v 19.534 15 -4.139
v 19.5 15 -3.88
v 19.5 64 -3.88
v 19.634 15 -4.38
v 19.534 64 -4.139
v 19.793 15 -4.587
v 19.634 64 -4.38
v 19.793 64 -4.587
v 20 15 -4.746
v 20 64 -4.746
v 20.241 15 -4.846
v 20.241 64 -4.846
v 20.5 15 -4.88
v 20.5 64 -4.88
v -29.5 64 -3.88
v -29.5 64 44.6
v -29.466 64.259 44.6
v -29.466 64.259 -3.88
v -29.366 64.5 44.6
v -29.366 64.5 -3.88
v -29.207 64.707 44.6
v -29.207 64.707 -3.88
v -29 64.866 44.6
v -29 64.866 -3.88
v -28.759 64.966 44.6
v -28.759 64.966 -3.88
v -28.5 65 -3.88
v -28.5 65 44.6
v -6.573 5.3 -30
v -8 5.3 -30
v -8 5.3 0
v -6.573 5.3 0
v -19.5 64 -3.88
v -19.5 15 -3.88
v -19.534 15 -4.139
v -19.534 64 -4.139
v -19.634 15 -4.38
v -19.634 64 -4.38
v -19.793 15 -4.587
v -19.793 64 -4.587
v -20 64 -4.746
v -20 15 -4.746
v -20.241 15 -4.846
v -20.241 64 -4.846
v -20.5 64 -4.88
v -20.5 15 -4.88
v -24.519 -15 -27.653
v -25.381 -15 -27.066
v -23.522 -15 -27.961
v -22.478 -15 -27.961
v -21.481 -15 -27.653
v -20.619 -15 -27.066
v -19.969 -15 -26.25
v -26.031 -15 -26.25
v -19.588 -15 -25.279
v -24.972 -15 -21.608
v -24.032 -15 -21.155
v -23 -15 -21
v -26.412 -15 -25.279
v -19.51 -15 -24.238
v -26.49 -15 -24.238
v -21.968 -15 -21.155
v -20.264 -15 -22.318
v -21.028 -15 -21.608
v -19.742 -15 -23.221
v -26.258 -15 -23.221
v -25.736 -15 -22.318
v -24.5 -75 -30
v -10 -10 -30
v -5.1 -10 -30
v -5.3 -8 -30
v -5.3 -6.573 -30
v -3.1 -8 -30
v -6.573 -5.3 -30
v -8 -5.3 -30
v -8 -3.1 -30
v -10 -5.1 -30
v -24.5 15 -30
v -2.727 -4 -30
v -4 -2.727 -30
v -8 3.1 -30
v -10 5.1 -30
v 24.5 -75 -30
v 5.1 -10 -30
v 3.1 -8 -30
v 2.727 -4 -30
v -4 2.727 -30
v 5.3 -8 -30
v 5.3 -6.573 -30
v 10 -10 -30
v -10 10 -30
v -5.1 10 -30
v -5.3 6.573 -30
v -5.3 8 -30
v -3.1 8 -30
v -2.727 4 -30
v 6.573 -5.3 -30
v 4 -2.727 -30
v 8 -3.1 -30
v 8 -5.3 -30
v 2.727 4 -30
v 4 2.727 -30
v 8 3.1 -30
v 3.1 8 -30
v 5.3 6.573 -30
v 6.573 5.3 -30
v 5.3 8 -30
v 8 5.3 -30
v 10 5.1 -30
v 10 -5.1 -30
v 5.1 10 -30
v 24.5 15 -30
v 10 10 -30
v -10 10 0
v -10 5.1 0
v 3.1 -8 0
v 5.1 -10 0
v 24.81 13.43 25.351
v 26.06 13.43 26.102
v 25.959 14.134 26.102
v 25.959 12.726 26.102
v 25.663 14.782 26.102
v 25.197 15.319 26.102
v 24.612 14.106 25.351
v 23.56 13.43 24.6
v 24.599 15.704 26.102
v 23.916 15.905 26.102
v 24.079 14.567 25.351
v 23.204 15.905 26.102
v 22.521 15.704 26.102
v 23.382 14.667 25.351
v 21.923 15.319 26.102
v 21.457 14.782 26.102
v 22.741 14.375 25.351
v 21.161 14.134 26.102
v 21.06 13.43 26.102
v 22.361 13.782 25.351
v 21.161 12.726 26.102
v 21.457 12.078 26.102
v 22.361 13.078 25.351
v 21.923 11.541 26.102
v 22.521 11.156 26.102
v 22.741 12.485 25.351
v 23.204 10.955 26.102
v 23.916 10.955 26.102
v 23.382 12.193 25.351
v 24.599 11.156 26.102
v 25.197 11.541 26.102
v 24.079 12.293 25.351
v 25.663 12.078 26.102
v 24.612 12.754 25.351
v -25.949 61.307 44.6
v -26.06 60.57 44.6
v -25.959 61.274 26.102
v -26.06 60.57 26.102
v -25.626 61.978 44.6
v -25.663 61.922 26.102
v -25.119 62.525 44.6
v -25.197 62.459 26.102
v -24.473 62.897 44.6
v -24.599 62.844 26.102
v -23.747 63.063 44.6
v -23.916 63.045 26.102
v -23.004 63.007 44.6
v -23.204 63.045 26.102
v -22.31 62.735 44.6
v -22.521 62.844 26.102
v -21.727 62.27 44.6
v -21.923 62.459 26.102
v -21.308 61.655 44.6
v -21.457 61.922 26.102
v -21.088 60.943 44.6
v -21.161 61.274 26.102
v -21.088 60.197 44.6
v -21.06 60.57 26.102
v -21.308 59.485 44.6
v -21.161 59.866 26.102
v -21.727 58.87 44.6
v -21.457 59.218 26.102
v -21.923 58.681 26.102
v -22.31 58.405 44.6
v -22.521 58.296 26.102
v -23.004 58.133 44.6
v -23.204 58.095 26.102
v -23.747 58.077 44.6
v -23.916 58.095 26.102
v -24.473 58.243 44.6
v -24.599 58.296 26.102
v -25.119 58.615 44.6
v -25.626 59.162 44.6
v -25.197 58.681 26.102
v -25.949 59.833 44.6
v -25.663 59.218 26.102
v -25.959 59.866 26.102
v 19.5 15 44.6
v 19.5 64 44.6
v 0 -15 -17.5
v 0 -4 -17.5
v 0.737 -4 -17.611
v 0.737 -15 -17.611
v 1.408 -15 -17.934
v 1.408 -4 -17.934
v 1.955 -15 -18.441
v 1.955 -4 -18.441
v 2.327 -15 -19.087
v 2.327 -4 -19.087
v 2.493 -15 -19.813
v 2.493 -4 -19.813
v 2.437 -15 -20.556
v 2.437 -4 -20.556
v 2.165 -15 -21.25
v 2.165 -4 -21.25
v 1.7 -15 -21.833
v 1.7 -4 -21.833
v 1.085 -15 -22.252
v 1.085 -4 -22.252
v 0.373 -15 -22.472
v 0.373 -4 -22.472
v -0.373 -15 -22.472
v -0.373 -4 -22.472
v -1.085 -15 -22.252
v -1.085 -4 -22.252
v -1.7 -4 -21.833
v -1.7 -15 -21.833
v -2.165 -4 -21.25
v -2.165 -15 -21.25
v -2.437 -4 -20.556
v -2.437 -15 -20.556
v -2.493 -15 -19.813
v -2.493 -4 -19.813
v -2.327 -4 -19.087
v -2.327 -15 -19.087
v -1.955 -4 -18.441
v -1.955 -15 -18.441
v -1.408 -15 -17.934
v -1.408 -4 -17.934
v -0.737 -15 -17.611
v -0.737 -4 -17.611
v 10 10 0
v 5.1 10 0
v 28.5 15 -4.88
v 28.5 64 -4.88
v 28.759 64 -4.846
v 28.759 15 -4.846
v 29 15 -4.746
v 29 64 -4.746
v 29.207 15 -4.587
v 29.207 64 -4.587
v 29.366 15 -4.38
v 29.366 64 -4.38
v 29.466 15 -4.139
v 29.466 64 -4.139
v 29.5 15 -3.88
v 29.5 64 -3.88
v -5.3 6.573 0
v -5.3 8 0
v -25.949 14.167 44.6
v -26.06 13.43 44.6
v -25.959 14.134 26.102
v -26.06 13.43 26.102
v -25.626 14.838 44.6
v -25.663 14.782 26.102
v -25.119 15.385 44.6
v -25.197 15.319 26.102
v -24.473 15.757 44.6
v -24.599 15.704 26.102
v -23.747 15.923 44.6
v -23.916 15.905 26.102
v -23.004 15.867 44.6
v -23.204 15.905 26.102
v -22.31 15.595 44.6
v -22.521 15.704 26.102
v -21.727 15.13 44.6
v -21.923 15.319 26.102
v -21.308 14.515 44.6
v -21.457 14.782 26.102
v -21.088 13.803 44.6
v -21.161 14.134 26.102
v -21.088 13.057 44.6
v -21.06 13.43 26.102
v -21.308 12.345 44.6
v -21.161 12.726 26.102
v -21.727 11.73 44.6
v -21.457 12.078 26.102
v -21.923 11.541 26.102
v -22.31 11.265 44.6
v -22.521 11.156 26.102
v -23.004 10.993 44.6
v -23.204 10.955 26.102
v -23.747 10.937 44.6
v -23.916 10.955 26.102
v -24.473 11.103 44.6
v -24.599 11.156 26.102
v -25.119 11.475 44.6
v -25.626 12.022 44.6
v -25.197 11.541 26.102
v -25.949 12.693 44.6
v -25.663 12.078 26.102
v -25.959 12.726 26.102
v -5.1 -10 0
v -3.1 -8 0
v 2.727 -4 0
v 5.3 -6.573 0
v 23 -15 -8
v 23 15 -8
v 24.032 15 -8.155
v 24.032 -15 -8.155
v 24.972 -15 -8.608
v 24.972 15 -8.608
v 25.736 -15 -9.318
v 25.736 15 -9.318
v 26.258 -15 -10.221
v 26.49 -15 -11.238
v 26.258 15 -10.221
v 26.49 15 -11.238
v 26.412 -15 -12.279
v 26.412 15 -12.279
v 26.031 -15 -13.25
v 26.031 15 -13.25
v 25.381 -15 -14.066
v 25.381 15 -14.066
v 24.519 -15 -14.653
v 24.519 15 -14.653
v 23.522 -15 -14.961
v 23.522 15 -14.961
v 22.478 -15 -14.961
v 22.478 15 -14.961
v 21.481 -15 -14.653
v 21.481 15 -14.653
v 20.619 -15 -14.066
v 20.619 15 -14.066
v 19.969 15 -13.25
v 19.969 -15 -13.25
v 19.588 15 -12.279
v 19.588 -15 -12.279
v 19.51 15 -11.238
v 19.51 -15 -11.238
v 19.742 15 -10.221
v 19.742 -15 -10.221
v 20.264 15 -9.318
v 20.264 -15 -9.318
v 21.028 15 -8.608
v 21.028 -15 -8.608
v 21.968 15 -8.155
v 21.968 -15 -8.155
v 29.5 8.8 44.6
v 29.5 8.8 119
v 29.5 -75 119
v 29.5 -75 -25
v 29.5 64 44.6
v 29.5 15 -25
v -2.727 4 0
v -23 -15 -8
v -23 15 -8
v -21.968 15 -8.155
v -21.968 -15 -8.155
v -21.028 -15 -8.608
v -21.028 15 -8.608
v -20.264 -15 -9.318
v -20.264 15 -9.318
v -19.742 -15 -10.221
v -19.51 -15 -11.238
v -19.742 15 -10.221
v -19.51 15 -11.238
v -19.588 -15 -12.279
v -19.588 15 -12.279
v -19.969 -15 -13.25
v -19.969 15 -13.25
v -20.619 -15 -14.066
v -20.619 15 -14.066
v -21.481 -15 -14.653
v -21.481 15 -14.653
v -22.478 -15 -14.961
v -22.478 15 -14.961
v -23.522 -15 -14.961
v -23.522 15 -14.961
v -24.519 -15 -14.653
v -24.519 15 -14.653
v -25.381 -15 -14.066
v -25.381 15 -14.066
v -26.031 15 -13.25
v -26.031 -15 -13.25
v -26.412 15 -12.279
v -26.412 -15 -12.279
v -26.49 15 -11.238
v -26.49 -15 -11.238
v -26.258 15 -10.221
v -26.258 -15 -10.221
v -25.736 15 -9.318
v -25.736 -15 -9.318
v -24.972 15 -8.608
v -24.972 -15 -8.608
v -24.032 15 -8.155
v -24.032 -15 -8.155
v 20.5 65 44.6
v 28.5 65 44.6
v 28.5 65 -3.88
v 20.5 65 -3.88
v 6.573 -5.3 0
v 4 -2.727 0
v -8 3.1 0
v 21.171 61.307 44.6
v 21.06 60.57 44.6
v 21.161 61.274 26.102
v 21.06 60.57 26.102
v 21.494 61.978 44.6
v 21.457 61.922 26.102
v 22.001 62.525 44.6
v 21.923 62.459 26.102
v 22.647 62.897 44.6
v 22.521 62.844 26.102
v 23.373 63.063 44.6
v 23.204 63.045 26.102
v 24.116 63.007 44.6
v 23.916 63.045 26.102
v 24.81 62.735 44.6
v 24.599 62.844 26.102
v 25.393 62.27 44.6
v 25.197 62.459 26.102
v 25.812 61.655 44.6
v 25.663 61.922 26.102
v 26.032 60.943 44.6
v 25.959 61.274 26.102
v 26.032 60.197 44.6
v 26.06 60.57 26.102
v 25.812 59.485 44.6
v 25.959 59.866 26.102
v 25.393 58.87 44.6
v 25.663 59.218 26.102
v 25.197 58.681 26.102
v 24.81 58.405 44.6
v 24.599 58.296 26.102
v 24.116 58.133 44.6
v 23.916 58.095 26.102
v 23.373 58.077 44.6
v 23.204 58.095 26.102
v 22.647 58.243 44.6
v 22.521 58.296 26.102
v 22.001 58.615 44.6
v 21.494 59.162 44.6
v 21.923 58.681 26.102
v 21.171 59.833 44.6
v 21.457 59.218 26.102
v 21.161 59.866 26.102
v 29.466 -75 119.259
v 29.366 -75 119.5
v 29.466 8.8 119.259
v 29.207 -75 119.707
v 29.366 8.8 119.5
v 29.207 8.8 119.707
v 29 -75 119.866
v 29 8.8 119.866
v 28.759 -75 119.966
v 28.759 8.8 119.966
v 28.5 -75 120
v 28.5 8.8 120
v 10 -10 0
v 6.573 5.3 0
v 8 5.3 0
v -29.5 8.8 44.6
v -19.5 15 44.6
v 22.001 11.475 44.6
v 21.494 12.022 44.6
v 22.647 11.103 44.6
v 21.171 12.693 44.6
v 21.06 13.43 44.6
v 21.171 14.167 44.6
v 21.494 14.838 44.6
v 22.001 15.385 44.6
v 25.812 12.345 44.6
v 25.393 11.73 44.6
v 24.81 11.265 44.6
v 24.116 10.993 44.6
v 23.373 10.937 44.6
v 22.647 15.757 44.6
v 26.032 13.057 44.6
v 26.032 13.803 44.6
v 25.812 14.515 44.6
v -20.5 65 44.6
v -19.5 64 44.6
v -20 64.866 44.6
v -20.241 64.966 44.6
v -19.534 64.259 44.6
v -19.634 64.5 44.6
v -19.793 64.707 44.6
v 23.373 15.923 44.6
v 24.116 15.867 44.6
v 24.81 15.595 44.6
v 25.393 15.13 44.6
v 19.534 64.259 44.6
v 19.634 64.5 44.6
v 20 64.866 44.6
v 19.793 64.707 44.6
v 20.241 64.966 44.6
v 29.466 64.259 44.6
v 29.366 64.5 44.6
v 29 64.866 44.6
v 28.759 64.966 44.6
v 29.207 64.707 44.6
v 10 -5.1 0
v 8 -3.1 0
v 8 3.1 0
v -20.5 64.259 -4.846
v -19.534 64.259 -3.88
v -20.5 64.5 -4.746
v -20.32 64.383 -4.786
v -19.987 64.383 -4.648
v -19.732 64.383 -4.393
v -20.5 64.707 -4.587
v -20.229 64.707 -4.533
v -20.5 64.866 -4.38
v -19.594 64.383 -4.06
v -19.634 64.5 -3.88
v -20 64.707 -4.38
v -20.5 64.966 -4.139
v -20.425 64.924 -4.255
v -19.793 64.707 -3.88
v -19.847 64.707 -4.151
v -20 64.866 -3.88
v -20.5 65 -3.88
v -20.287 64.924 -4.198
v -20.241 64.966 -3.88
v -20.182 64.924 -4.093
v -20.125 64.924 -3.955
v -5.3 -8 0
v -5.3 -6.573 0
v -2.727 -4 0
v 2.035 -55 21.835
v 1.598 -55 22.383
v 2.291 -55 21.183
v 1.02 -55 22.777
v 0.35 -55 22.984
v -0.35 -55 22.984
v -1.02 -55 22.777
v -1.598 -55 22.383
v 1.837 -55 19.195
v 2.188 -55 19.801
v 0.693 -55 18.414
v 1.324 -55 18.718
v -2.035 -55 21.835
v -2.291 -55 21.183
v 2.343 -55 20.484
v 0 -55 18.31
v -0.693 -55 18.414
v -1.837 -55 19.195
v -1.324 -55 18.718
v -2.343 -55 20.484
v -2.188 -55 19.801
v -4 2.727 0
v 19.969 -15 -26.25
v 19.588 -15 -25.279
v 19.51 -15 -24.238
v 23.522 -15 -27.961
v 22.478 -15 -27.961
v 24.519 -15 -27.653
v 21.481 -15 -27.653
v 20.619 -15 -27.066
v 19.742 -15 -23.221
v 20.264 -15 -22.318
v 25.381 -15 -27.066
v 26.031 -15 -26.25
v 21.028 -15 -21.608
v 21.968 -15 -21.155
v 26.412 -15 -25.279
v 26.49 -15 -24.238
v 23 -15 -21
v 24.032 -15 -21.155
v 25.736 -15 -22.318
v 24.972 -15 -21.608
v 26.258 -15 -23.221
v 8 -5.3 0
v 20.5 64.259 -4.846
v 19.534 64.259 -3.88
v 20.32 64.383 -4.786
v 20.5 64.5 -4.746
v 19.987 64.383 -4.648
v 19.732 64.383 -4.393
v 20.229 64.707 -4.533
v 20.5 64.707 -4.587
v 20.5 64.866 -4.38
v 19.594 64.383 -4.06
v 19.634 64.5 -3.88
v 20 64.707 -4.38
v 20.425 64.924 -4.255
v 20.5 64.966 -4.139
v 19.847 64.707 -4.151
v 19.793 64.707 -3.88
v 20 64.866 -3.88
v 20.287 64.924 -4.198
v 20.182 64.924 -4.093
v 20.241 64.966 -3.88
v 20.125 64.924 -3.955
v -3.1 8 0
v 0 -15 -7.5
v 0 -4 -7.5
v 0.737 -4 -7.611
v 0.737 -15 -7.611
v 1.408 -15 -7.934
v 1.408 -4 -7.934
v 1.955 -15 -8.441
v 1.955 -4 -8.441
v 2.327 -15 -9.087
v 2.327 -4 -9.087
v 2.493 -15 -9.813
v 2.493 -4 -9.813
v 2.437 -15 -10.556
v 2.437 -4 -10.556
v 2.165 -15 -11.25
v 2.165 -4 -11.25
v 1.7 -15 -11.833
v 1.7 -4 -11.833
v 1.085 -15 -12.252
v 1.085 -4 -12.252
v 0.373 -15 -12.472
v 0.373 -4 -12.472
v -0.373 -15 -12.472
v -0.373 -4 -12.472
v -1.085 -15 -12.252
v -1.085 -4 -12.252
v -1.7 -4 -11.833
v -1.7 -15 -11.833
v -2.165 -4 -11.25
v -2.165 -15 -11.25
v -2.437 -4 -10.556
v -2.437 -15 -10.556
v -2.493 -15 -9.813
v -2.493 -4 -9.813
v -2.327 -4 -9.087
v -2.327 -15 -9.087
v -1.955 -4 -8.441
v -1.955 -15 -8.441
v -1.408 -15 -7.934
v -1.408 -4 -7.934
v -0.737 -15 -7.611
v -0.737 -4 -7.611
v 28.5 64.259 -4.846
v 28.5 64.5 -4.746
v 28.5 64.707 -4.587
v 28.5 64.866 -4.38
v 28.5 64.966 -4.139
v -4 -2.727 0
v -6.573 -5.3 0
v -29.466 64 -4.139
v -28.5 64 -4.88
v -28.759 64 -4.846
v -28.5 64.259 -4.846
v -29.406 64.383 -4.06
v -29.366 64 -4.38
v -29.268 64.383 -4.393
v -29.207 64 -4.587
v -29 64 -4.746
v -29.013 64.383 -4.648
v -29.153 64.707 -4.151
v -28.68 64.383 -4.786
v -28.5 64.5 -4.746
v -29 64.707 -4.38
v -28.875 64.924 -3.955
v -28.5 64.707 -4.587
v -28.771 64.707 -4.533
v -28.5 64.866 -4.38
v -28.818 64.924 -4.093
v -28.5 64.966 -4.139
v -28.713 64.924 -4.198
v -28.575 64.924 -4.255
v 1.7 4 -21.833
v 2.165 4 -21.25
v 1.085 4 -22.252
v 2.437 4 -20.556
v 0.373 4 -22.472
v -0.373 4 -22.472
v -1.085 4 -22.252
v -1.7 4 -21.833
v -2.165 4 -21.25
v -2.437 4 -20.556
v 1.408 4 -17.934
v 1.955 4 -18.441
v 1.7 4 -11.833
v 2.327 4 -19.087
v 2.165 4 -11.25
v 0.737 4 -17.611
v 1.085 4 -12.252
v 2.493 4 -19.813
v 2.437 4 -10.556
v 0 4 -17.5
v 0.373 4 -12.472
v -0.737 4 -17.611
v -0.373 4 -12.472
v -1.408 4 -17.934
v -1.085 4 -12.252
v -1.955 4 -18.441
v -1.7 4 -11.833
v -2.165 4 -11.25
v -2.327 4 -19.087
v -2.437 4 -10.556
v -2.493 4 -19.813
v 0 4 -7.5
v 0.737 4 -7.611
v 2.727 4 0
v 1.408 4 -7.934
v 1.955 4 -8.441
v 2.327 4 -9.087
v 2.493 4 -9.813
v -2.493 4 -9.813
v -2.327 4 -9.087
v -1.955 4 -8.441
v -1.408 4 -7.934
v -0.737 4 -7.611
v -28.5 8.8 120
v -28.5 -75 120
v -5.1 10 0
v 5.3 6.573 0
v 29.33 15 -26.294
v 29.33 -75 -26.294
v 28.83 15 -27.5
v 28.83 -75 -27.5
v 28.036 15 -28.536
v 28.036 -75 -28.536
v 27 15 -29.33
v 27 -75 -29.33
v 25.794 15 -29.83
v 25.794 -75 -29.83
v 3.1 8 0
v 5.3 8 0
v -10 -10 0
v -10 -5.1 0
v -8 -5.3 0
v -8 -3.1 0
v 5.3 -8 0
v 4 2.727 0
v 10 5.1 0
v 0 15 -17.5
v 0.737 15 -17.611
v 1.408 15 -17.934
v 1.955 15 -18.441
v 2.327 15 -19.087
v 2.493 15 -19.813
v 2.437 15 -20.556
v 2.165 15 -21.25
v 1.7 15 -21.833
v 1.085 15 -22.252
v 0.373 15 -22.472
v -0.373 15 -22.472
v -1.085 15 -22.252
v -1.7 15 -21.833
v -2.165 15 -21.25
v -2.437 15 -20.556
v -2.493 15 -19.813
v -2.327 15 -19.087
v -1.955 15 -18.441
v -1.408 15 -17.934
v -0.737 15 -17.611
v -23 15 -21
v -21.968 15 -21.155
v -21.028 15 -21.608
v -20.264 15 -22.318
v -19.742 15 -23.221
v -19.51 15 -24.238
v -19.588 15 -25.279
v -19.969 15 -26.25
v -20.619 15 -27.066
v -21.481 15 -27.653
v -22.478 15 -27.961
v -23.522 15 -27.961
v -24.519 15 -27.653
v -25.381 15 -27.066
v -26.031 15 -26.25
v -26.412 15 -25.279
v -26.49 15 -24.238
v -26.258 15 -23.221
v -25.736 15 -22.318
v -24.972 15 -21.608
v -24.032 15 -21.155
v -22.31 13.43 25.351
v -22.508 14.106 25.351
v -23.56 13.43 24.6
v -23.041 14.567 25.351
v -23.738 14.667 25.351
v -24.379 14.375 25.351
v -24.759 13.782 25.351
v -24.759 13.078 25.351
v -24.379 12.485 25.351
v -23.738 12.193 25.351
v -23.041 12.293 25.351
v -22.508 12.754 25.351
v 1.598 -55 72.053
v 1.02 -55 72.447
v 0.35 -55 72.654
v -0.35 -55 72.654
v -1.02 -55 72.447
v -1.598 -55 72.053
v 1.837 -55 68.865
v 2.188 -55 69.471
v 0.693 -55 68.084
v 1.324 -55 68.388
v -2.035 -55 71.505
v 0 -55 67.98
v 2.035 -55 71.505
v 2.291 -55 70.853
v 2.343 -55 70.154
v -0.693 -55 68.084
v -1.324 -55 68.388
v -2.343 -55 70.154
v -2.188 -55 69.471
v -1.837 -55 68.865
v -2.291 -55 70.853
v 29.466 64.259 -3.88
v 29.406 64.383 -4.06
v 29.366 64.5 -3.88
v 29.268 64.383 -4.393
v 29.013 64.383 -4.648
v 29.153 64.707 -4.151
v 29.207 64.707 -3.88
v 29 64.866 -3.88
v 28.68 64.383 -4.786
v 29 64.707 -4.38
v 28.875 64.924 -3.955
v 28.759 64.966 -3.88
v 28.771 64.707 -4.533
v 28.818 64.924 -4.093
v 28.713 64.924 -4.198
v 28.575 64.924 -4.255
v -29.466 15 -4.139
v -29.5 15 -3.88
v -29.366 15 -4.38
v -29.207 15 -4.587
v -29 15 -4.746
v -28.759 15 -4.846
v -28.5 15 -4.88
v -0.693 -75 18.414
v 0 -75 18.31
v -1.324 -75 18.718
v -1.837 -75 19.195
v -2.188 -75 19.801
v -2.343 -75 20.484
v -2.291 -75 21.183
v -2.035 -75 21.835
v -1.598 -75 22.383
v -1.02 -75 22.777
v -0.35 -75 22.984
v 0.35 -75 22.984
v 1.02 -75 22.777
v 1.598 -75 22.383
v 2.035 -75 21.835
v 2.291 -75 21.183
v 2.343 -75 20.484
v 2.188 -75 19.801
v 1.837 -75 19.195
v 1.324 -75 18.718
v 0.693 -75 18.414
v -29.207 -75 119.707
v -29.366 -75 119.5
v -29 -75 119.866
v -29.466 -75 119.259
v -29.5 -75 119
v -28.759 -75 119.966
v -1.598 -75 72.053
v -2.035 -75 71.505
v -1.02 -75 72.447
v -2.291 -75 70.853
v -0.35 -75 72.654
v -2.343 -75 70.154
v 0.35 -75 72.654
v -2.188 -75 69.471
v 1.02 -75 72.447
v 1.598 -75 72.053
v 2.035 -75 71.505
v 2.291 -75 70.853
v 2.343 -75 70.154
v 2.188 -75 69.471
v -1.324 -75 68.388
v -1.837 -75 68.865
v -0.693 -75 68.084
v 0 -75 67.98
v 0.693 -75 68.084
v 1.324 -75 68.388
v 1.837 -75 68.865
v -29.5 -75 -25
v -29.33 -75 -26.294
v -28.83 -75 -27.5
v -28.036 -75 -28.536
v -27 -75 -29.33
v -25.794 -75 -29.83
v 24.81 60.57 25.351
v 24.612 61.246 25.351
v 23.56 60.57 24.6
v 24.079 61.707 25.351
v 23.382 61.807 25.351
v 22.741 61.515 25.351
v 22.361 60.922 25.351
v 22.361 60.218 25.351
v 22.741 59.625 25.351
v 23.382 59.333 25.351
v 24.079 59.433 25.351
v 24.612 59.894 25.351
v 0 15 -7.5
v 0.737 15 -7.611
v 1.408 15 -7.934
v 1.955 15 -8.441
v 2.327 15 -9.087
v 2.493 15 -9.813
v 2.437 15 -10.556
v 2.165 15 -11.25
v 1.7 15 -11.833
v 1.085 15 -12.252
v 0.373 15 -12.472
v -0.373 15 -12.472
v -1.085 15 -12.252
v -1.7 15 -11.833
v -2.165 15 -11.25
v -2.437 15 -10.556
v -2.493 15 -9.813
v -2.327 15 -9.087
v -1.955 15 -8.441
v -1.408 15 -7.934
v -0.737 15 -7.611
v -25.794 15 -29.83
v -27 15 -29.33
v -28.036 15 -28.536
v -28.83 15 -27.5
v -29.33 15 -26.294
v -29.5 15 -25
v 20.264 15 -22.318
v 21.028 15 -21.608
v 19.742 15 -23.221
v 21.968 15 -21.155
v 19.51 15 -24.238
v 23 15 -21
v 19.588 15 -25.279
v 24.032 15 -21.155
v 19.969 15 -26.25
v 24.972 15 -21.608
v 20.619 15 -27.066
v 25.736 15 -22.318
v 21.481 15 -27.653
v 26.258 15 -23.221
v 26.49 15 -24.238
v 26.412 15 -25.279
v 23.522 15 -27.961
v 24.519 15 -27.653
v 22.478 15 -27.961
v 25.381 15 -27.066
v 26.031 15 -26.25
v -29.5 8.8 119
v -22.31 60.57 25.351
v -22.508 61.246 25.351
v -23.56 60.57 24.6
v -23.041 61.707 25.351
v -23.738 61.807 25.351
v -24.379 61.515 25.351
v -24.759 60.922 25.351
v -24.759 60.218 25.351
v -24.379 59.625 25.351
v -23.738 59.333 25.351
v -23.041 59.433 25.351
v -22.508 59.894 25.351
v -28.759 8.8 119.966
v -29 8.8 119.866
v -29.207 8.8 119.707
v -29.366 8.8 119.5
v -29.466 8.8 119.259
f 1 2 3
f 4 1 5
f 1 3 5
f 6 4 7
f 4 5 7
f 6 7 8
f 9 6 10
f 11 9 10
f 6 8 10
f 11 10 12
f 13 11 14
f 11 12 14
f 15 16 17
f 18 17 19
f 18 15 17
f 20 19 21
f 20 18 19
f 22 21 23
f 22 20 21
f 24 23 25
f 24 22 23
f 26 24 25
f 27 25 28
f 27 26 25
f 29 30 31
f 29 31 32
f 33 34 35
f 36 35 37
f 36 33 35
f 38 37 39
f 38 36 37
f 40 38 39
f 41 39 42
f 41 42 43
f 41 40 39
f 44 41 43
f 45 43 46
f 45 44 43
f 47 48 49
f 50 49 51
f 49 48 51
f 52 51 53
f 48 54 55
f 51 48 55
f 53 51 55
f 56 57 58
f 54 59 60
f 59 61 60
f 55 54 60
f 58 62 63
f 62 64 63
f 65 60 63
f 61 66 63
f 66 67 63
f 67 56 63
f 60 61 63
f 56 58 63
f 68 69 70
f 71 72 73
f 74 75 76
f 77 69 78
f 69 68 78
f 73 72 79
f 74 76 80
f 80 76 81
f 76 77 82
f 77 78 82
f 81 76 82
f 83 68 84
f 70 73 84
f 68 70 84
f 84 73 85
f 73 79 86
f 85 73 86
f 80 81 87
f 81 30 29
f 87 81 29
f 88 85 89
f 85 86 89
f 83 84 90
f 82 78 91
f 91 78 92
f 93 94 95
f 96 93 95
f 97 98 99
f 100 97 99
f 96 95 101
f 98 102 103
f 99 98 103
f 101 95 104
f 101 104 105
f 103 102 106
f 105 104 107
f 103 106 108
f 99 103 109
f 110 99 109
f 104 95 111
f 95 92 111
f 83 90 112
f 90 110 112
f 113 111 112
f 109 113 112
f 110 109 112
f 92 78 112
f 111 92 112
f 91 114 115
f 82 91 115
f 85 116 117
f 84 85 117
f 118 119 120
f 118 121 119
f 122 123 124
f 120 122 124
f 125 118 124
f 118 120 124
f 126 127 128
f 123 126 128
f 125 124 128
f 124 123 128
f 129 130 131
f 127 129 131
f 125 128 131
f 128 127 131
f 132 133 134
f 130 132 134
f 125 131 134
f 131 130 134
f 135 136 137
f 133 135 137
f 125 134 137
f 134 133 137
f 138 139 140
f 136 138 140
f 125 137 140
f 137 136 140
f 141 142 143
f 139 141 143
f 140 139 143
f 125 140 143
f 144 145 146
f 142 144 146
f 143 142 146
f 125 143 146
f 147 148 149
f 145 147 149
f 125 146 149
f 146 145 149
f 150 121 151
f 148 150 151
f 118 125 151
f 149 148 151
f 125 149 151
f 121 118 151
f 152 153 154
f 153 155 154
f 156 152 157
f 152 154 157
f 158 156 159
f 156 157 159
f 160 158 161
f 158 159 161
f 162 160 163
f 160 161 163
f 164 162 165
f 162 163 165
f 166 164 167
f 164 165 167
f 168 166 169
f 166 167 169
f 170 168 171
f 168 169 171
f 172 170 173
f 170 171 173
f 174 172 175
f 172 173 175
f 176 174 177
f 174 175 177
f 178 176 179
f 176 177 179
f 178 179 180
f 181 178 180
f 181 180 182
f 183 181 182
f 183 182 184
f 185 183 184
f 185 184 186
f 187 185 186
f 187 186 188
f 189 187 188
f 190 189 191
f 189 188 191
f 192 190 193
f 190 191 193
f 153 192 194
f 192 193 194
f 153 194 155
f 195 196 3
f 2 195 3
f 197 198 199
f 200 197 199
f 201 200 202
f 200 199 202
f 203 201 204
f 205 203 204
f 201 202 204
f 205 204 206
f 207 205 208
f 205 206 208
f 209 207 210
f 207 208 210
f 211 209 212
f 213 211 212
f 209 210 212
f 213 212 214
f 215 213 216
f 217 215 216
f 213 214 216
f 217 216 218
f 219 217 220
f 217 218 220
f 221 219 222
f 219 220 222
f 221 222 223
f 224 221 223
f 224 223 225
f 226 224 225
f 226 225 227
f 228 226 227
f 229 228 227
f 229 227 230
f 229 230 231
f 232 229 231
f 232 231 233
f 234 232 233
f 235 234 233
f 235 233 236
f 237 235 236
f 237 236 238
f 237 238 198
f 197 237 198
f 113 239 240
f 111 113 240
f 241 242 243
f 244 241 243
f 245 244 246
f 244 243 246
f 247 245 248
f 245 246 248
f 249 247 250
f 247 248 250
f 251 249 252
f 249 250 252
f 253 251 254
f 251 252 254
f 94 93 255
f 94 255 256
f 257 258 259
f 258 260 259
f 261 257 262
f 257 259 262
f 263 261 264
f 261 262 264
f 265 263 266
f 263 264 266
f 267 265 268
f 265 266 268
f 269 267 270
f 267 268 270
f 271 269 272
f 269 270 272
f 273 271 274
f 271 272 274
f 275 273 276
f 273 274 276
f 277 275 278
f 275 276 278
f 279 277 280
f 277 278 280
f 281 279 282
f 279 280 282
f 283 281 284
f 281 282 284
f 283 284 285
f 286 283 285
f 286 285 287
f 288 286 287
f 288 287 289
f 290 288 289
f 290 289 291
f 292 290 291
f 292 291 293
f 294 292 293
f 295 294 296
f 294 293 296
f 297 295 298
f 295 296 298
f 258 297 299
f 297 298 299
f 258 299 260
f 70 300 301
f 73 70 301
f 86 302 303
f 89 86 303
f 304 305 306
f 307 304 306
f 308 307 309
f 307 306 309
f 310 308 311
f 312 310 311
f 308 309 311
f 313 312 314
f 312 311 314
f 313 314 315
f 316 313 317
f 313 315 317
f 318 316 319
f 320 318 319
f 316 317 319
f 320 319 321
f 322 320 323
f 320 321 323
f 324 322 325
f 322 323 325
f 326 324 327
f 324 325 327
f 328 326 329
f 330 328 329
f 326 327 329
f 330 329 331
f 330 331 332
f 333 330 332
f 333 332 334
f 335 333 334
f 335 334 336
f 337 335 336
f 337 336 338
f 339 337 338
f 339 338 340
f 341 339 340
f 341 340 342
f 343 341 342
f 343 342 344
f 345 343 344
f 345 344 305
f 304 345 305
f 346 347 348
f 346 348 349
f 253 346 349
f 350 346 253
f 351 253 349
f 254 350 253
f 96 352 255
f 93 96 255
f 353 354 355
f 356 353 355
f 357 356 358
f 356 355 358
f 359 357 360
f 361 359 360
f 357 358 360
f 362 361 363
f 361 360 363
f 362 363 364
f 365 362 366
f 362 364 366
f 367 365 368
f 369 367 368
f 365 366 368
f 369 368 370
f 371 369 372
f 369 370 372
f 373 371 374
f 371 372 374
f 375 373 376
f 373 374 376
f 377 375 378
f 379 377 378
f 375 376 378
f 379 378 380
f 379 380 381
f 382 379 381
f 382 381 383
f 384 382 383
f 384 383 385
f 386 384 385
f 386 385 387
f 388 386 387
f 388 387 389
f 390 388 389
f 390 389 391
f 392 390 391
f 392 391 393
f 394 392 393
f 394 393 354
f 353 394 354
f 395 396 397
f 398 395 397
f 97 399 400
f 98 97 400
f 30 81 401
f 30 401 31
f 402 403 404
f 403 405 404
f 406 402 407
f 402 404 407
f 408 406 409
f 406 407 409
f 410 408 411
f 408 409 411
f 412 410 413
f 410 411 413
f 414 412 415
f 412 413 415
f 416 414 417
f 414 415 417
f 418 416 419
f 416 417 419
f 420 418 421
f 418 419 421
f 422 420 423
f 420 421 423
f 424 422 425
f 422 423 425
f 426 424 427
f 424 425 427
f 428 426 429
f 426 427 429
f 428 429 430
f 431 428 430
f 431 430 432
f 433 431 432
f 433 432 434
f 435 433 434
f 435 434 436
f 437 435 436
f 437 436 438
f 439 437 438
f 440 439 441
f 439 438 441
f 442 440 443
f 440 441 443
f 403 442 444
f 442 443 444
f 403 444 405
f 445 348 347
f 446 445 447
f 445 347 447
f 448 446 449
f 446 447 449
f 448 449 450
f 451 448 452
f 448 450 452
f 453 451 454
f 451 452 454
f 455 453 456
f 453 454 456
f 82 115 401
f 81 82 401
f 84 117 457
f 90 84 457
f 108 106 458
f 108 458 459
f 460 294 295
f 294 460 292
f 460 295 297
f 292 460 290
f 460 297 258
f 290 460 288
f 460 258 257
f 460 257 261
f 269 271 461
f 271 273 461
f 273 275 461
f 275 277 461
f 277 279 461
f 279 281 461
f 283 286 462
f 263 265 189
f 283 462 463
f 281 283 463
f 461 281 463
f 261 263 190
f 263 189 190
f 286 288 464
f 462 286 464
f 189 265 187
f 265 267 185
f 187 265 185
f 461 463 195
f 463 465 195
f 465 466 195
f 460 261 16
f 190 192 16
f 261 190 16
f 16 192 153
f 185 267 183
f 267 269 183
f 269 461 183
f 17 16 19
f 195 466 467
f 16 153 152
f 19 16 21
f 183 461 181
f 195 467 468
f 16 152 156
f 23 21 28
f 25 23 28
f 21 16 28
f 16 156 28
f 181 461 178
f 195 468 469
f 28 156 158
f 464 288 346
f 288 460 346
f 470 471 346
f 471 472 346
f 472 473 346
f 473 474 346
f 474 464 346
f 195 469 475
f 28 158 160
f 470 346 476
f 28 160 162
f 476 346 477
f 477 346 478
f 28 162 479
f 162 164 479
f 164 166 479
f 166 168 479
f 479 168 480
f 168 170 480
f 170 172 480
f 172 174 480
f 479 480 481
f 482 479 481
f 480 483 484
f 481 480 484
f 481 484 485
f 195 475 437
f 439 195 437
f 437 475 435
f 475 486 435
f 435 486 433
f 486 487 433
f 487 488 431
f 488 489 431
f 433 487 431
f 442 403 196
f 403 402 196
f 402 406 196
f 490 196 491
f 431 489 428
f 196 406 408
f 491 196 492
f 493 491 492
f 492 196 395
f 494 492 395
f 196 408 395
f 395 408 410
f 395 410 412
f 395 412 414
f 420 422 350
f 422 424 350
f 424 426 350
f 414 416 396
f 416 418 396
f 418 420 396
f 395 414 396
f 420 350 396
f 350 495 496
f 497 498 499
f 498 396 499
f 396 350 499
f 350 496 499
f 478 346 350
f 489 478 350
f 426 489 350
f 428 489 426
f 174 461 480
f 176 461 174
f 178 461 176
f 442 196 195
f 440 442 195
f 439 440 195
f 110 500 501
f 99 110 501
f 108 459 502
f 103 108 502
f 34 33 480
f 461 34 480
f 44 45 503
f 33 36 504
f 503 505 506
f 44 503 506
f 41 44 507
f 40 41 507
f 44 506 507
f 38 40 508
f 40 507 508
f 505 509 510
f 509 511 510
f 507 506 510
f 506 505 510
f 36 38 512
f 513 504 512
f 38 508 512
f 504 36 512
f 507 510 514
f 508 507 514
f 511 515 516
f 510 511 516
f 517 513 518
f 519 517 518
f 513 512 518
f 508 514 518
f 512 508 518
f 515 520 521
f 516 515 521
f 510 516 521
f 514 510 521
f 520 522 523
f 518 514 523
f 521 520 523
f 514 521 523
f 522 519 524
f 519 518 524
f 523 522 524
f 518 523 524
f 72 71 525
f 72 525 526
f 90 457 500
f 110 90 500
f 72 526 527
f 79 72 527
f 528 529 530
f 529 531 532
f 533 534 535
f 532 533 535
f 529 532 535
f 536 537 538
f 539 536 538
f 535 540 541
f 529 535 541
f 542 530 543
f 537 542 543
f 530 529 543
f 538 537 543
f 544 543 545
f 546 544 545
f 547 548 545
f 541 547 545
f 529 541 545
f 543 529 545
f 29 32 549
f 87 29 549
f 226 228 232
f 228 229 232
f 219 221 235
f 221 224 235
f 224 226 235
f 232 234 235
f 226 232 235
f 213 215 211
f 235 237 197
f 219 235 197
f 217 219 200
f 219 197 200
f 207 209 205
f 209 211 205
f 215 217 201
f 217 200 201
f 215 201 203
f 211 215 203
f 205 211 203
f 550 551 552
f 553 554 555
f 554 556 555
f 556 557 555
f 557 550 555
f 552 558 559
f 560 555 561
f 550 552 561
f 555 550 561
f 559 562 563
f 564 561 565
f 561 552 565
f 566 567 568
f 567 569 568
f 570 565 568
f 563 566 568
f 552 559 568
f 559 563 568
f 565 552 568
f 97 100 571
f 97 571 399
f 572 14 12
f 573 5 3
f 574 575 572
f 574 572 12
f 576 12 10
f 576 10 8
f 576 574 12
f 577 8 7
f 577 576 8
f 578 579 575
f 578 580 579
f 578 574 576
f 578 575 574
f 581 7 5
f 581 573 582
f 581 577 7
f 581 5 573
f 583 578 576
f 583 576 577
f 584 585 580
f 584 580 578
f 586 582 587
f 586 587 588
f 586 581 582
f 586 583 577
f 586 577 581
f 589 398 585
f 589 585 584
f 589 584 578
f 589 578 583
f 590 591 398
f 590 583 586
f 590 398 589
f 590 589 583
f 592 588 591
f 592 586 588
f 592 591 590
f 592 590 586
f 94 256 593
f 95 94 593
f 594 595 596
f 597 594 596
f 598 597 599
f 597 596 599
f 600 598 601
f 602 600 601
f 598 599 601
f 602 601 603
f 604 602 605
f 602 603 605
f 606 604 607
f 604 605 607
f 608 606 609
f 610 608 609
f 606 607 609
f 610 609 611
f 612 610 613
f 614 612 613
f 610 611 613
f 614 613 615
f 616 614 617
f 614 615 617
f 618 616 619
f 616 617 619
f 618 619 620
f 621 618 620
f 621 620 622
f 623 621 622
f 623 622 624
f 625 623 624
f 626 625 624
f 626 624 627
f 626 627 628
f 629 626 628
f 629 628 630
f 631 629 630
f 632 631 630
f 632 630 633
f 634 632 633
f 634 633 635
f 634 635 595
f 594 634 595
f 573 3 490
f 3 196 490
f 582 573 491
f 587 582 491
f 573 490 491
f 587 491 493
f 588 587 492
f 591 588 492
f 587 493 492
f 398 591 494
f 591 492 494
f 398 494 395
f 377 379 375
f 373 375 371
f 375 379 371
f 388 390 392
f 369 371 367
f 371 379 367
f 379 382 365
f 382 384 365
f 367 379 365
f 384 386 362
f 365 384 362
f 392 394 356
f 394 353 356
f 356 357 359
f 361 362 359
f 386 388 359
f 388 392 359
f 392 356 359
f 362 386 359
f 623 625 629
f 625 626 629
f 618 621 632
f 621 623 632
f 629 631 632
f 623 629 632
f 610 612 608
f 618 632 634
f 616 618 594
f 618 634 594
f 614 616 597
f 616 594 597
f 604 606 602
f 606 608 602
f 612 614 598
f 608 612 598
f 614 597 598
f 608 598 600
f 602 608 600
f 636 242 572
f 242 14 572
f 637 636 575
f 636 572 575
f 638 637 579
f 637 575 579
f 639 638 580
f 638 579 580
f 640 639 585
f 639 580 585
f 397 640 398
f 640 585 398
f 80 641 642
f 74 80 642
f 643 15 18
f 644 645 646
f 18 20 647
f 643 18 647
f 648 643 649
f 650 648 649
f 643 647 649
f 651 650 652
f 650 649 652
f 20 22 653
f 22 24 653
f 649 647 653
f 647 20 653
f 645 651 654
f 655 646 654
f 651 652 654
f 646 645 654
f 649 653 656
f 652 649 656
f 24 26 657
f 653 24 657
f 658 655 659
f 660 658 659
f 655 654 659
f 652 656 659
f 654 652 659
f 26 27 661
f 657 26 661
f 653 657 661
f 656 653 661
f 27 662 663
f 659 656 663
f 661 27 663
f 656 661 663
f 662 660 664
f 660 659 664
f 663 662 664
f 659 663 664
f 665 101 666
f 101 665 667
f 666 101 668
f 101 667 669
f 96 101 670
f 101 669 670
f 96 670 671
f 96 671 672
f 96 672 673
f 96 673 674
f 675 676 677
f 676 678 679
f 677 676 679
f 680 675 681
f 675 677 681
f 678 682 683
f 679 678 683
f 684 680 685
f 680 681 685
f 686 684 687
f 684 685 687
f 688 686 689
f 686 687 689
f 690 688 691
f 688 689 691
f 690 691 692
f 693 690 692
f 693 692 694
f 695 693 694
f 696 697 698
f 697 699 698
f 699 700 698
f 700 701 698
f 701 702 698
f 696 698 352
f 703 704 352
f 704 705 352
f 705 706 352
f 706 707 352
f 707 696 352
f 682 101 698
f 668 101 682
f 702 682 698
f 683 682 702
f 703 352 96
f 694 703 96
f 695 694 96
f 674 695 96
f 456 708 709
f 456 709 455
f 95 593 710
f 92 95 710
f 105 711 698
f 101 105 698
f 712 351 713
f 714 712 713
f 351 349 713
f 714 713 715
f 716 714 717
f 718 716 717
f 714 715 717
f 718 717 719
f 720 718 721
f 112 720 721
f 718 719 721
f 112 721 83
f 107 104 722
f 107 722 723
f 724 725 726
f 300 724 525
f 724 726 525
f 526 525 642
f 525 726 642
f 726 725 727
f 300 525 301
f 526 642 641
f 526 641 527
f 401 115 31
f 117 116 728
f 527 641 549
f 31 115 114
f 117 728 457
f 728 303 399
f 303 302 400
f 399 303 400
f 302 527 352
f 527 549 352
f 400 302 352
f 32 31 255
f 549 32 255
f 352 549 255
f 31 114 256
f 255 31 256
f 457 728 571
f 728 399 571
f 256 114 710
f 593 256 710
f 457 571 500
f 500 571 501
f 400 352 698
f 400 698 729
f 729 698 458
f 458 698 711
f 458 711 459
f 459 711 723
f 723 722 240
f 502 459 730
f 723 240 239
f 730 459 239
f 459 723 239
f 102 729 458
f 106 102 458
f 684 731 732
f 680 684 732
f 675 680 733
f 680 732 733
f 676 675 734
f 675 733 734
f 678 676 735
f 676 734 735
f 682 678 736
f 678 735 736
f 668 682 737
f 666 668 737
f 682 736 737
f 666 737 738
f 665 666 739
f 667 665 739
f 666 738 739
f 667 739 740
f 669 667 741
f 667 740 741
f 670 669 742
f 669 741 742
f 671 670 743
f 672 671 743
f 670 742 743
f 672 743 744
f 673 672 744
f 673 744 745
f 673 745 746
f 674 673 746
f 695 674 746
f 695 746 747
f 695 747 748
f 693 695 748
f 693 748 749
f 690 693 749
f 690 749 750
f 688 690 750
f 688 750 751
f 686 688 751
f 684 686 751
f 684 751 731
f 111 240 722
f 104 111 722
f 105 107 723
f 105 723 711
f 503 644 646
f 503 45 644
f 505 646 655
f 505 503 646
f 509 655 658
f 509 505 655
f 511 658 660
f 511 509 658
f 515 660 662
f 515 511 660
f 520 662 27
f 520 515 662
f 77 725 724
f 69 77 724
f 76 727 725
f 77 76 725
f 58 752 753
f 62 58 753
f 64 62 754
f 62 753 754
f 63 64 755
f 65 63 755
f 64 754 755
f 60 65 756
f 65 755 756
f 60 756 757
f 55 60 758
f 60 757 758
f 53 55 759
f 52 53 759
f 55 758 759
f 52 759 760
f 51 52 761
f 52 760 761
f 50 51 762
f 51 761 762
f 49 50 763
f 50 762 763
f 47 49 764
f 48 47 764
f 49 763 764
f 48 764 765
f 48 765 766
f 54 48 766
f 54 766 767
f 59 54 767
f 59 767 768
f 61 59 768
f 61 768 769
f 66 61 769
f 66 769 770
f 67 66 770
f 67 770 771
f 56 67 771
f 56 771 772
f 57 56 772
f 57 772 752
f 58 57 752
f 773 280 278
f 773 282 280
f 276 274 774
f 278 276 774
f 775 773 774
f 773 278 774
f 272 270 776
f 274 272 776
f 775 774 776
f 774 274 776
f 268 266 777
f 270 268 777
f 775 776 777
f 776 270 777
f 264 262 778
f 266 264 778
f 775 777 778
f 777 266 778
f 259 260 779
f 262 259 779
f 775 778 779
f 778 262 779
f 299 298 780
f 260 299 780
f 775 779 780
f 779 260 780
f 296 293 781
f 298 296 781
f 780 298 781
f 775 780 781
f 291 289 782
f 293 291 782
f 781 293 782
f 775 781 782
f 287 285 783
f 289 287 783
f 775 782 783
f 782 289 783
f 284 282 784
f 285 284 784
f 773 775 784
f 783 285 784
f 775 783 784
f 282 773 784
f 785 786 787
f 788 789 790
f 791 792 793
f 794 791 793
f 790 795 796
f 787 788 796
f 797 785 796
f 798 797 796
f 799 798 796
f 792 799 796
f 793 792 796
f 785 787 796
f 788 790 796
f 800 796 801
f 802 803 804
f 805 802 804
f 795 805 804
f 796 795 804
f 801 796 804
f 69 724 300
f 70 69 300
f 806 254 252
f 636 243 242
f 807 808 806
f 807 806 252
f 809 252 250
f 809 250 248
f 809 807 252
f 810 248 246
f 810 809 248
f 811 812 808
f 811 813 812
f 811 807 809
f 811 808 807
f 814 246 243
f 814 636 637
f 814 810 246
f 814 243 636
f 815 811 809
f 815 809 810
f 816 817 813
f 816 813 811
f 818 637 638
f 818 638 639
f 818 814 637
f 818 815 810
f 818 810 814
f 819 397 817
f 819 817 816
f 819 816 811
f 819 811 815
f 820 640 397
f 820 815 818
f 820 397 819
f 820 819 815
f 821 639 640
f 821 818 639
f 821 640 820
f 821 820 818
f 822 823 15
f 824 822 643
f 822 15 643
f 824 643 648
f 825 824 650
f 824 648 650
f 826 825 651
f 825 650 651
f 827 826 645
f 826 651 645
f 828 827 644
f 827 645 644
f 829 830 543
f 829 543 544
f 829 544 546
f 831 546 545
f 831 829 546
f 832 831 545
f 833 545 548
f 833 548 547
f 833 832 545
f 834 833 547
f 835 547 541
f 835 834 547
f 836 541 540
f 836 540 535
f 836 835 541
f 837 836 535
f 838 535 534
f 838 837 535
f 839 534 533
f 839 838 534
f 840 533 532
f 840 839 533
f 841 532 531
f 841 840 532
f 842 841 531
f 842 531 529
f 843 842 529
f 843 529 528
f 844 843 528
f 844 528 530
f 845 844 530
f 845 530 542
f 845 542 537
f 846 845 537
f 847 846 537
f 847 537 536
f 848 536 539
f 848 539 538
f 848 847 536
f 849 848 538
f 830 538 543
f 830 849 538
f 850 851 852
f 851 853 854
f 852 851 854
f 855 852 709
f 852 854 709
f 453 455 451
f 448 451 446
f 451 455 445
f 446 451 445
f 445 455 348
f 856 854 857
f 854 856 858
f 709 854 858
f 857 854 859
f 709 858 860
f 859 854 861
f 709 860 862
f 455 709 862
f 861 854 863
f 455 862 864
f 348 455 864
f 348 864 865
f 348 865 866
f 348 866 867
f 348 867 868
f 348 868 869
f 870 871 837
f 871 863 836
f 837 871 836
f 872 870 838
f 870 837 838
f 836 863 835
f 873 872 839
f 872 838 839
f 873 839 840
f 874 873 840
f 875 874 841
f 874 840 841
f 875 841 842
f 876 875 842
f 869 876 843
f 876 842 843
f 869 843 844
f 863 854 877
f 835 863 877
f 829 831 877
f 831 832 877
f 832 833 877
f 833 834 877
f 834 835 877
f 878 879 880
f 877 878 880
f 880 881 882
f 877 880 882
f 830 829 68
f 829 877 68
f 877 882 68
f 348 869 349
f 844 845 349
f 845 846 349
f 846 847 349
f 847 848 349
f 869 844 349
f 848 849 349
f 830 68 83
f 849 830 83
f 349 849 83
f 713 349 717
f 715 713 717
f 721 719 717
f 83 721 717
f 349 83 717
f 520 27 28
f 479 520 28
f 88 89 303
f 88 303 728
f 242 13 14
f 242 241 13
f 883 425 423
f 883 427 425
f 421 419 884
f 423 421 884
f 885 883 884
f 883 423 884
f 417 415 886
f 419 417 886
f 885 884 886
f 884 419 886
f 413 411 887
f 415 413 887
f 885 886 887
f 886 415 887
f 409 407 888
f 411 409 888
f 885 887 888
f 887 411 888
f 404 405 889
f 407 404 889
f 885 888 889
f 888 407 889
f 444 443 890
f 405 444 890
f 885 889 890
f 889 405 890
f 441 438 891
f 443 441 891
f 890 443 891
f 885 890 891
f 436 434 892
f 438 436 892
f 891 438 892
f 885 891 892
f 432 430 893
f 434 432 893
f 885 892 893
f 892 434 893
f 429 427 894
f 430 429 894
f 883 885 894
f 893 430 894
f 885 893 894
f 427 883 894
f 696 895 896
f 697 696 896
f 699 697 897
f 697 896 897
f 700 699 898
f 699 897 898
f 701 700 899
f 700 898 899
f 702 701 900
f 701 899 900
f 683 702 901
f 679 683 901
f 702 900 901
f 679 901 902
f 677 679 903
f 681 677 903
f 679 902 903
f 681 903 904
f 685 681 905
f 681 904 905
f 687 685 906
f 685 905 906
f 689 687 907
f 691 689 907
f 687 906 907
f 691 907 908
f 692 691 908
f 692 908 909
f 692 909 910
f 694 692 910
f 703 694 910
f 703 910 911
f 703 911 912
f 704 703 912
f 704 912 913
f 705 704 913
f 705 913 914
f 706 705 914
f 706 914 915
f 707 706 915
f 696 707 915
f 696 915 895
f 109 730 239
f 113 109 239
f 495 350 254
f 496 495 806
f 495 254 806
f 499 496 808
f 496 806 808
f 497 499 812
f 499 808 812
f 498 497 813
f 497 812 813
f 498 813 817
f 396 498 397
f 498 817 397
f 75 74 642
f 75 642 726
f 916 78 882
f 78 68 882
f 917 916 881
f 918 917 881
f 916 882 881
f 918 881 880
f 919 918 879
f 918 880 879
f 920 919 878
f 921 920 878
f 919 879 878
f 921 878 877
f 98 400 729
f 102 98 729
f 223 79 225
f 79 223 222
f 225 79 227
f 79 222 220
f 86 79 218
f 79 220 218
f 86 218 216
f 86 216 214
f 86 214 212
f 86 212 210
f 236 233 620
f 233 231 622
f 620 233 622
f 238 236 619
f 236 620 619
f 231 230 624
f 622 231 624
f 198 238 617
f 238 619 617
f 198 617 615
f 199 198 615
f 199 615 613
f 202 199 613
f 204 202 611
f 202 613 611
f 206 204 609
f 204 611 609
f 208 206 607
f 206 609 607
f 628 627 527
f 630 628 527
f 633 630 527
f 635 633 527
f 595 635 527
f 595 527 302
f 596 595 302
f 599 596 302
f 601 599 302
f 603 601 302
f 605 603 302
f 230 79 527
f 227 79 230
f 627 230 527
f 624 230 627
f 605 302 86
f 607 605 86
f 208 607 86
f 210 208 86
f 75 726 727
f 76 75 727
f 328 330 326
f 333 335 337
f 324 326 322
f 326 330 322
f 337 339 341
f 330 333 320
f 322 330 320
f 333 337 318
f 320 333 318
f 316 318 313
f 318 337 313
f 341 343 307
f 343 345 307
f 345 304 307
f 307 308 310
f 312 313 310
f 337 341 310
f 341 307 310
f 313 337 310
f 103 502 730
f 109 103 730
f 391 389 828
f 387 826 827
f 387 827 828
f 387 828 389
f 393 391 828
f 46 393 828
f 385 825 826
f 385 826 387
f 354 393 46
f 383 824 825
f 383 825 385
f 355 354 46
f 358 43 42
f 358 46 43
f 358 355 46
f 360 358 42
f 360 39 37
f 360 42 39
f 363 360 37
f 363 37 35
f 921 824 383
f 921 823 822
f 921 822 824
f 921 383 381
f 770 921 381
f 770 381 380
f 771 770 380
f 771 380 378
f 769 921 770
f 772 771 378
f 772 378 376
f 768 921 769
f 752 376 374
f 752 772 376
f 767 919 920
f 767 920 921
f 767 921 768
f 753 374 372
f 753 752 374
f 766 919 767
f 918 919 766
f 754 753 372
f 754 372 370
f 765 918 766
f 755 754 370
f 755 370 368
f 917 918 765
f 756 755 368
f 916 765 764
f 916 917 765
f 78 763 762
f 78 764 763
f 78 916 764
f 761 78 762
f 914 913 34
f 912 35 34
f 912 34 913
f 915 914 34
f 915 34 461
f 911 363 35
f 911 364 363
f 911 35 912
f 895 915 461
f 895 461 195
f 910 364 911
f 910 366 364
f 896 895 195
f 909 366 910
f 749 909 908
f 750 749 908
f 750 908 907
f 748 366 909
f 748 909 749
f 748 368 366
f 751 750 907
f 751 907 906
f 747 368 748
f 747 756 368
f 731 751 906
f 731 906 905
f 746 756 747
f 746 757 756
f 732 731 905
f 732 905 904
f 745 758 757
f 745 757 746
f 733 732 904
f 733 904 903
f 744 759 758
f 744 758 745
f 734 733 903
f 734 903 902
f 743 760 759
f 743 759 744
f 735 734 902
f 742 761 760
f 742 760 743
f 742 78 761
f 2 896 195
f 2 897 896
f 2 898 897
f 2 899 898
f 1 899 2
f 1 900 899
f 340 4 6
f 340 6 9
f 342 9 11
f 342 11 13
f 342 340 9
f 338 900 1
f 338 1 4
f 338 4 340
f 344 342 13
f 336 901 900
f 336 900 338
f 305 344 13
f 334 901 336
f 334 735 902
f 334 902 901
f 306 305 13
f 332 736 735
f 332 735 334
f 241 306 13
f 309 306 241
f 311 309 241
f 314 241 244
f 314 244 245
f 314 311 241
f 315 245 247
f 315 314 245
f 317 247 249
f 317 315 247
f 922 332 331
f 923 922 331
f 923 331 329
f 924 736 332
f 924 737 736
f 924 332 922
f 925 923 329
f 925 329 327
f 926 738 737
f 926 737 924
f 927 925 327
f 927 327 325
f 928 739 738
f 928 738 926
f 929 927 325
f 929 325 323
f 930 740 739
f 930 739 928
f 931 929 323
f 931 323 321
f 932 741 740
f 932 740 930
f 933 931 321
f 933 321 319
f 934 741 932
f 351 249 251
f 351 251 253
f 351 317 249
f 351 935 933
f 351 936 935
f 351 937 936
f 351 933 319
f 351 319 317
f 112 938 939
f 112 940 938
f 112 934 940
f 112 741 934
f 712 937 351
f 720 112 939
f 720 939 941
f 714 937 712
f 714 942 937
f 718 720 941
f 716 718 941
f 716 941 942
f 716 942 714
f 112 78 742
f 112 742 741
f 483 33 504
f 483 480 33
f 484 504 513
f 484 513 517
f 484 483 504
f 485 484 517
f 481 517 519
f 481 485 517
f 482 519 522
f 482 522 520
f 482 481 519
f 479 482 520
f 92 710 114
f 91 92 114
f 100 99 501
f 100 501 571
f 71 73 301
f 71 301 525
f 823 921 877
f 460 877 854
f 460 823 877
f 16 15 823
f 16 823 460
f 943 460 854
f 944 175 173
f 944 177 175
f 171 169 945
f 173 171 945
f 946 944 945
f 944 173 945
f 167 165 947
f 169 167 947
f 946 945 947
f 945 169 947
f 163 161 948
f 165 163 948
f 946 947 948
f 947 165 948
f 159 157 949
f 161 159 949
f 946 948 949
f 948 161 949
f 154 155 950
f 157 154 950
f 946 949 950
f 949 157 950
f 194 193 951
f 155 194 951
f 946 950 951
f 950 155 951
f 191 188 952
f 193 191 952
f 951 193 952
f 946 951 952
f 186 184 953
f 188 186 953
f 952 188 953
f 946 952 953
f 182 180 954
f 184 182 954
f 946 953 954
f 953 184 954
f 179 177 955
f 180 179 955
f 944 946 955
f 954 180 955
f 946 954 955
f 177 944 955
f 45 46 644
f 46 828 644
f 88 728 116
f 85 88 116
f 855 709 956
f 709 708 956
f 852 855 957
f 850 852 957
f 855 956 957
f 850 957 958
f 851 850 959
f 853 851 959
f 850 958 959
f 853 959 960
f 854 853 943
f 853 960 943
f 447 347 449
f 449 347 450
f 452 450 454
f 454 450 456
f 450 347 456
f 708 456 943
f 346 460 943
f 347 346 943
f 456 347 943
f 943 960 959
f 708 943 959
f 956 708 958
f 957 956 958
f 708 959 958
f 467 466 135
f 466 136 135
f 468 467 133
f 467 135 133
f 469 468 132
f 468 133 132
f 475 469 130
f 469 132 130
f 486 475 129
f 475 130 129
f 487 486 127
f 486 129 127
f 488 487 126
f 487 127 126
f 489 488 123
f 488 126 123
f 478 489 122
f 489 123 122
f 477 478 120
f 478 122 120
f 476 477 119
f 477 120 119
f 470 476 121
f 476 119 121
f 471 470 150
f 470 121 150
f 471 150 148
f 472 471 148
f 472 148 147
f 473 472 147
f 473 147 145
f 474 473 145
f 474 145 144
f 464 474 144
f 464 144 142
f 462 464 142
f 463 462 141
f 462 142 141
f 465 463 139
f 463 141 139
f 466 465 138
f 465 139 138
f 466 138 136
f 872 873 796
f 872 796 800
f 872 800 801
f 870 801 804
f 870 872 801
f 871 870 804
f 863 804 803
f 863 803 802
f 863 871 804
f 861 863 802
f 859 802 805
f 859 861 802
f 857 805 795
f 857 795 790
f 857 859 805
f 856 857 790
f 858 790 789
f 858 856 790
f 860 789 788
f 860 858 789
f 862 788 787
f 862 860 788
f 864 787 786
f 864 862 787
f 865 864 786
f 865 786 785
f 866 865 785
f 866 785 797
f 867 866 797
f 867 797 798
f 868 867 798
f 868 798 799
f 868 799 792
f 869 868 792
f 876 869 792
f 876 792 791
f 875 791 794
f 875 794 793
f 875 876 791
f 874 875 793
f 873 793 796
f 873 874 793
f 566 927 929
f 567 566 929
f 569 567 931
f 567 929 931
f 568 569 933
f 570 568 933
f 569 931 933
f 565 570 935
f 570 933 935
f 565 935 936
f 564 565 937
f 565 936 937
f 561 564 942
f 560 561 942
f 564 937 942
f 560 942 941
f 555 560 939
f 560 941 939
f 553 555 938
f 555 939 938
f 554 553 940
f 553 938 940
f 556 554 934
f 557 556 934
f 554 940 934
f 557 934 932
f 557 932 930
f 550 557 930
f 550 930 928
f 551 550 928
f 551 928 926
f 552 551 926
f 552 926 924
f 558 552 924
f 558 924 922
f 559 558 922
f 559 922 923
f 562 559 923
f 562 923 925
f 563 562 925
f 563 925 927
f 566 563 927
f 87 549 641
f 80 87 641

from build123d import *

# Parameters (mm, degrees)
SKETCH1_W                    = 59
SKETCH1_H                    = 30
BOSS_EXTRUDE1_DEPTH          = 30
SKETCH2_R                    = 2.5
SKETCH2_R_2                  = 3.5
CUT_EXTRUDE1_DEPTH           = 52.674461778
SKETCH3_W                    = 59
SKETCH3_H                    = 60
BOSS_EXTRUDE2_DEPTH          = 30
FILLET2_R                    = 5
FILLET3_R                    = 5
SKETCH5_W                    = 59
SKETCH5_H                    = 90
BOSS_EXTRUDE3_DEPTH          = 120
SKETCH6_W                    = 75.4
SKETCH6_H                    = 6.2
CUT_EXTRUDE2_DEPTH           = 120
SKETCH6_3_W                  = 49.48
SKETCH6_3_H                  = 50
BOSS_EXTRUDE4_DEPTH          = 10
F_5_0_5_DIAMETER_HOLE1_D     = 5
F_5_0_5_DIAMETER_HOLE1_DEPTH = 18.497848452
F_5_0_5_DIAMETER_HOLE1_TIP   = 1.502151548
SKETCH14_W                   = 49.48
SKETCH14_H                   = 50
BOSS_EXTRUDE6_DEPTH          = 10
F_5_0_5_DIAMETER_HOLE2_D     = 5
F_5_0_5_DIAMETER_HOLE2_DEPTH = 18.497848452
F_5_0_5_DIAMETER_HOLE2_TIP   = 1.502151548
FILLET4_R                    = 1
FILLET5_R                    = 1
FILLET6_R                    = 1
FILLET7_R                    = 1
FILLET8_R                    = 1
FILLET9_R                    = 1
FILLET10_R                   = 1
FILLET11_R                   = 1
F_5_0_5_DIAMETER_HOLE3_D     = 5
F_5_0_5_DIAMETER_HOLE3_DEPTH = 18.497848452
F_5_0_5_DIAMETER_HOLE3_TIP   = 1.502151548
CUT_EXTRUDE3_START           = -75
SKETCH21_R                   = 2.35
CUT_EXTRUDE3_DEPTH           = 20


with BuildPart() as part:
    # Sketch1 → Boss-Extrude1 (new body)
    with BuildSketch(Plane.XY):
        Rectangle(SKETCH1_W, SKETCH1_H)
        Polygon((4, 2.727207794), (6.572792206, 5.3), (8, 5.3), (8, 3.1), (10, 5.1), (10, 10), (5.1, 10), (3.1, 8), (5.3, 8), (5.3, 6.572792206), (2.727207794, 4), (-2.727207794, 4), (-5.3, 6.572792206), (-5.3, 8), (-3.1, 8), (-5.1, 10), (-10, 10), (-10, 5.1), (-8, 3.1), (-8, 5.3), (-6.572792206, 5.3), (-4, 2.727207794), (-4, -2.727207794), (-6.572792206, -5.3), (-8, -5.3), (-8, -3.1), (-10, -5.1), (-10, -10), (-5.1, -10), (-3.1, -8), (-5.3, -8), (-5.3, -6.572792206), (-2.727207794, -4), (2.727207794, -4), (5.3, -6.572792206), (5.3, -8), (3.1, -8), (5.1, -10), (10, -10), (10, -5.1), (8, -3.1), (8, -5.3), (6.572792206, -5.3), (4, -2.727207794), align=None, mode=Mode.SUBTRACT)
    extrude(amount=-BOSS_EXTRUDE1_DEPTH)

    # Sketch2 → Cut-Extrude1 (cut, through all)
    with BuildSketch(Plane(origin=(0, 15, 0), x_dir=(1, 0, 0), z_dir=(0, 1, 0))):
        with Locations(Location((0, 10, 0), (0, 0, 270))):
            Circle(SKETCH2_R)
        with Locations(Location((0, 20, 0), (0, 0, 270))):
            Circle(SKETCH2_R)
        with Locations(Location((-23, 24.5, 0), (0, 0, 270))):
            Circle(SKETCH2_R_2)
        with Locations(Location((23, 24.5, 0), (0, 0, 270))):
            Circle(SKETCH2_R_2)
        with Locations(Location((23, 11.5, 0), (0, 0, 270))):
            Circle(SKETCH2_R_2)
        with Locations(Location((-23, 11.5, 0), (0, 0, 270))):
            Circle(SKETCH2_R_2)
    extrude(amount=-CUT_EXTRUDE1_DEPTH, mode=Mode.SUBTRACT)

    # Sketch3 → Boss-Extrude2 (add)
    with BuildSketch(Plane.XY):
        with Locations((0, -45)):
            Rectangle(SKETCH3_W, SKETCH3_H)
    extrude(amount=-BOSS_EXTRUDE2_DEPTH)

    # Fillet2
    fillet2_edges = [part.edges().sort_by_distance(p)[0] for p in [
        (29.5, -30, -30),
    ]]
    fillet(fillet2_edges, radius=FILLET2_R)

    # Fillet3
    fillet3_edges = [part.edges().sort_by_distance(p)[0] for p in [
        (-29.5, -30, -30),
    ]]
    fillet(fillet3_edges, radius=FILLET3_R)

    # Sketch5 → Boss-Extrude3 (add)
    with BuildSketch(Plane.XY):
        with Locations((0, -30)):
            Rectangle(SKETCH5_W, SKETCH5_H)
    extrude(amount=BOSS_EXTRUDE3_DEPTH)

    # Sketch6 → Cut-Extrude2 (cut)
    with BuildSketch(Plane.ZY.offset(29.5)):
        with Locations((82.3, 11.9)):
            Rectangle(SKETCH6_W, SKETCH6_H)
    extrude(amount=-CUT_EXTRUDE2_DEPTH, mode=Mode.SUBTRACT)

    # Sketch6<3> → Boss-Extrude4 (add)
    with BuildSketch(Plane.ZY.offset(29.5)):
        with Locations((19.86, 40)):
            Rectangle(SKETCH6_3_W, SKETCH6_3_H)
    extrude(amount=-BOSS_EXTRUDE4_DEPTH)

    # Ø5.0 (5) Diameter Hole1
    with Locations(Plane.XY.offset(44.6)):
        with Locations((-23.56, 60.57)):
            Hole(F_5_0_5_DIAMETER_HOLE1_D / 2, depth=F_5_0_5_DIAMETER_HOLE1_DEPTH)
            with Locations((0, 0, -(F_5_0_5_DIAMETER_HOLE1_DEPTH + F_5_0_5_DIAMETER_HOLE1_TIP / 2))):  # 118° drill point
                Cone(0, F_5_0_5_DIAMETER_HOLE1_D / 2, F_5_0_5_DIAMETER_HOLE1_TIP, mode=Mode.SUBTRACT)

    # Sketch14 → Boss-Extrude6 (add)
    with BuildSketch(Plane(origin=(29.5, 0, 0), x_dir=(0, 0, -1), z_dir=(1, 0, 0))):
        with Locations((-19.86, 40)):
            Rectangle(SKETCH14_W, SKETCH14_H)
    extrude(amount=-BOSS_EXTRUDE6_DEPTH)

    # Ø5.0 (5) Diameter Hole2
    with Locations(Plane.XY.offset(44.6)):
        with Locations((23.56, 60.57)):
            Hole(F_5_0_5_DIAMETER_HOLE2_D / 2, depth=F_5_0_5_DIAMETER_HOLE2_DEPTH)
            with Locations((0, 0, -(F_5_0_5_DIAMETER_HOLE2_DEPTH + F_5_0_5_DIAMETER_HOLE2_TIP / 2))):  # 118° drill point
                Cone(0, F_5_0_5_DIAMETER_HOLE2_D / 2, F_5_0_5_DIAMETER_HOLE2_TIP, mode=Mode.SUBTRACT)

    # Fillet4
    fillet4_edges = [part.edges().sort_by_distance(p)[0] for p in [
        (-29.5, 40, -4.88),
    ]]
    fillet(fillet4_edges, radius=FILLET4_R)

    # Fillet5
    fillet5_edges = [part.edges().sort_by_distance(p)[0] for p in [
        (-19.5, 40, -4.88),
    ]]
    fillet(fillet5_edges, radius=FILLET5_R)

    # Fillet6
    fillet6_edges = [part.edges().sort_by_distance(p)[0] for p in [
        (29.5, 40, -4.88),
    ]]
    fillet(fillet6_edges, radius=FILLET6_R)

    # Fillet7
    fillet7_edges = [part.edges().sort_by_distance(p)[0] for p in [
        (19.5, 40, -4.88),
    ]]
    fillet(fillet7_edges, radius=FILLET7_R)

    # Fillet8
    fillet8_edges = [part.edges().sort_by_distance(p)[0] for p in [
        (-19.5, 65, 20.36),
        (-29.5, 65, 20.36),
        (-29.207106781, 65, -4.587106781),
        (-24.5, 65, -4.88),
        (-19.792893219, 65, -4.587106781),
    ]]
    fillet(fillet8_edges, radius=FILLET8_R)

    # Fillet9
    fillet9_edges = [part.edges().sort_by_distance(p)[0] for p in [
        (29.5, 65, 20.36),
        (29.207106781, 65, -4.587106781),
        (19.5, 65, 20.36),
        (24.5, 65, -4.88),
        (19.792893219, 65, -4.587106781),
    ]]
    fillet(fillet9_edges, radius=FILLET9_R)

    # Fillet10
    fillet10_edges = [part.edges().sort_by_distance(p)[0] for p in [
        (29.5, -33.1, 120),
    ]]
    fillet(fillet10_edges, radius=FILLET10_R)

    # Fillet11
    fillet11_edges = [part.edges().sort_by_distance(p)[0] for p in [
        (-29.5, -33.1, 120),
    ]]
    fillet(fillet11_edges, radius=FILLET11_R)

    # Ø5.0 (5) Diameter Hole3
    with Locations(Plane.XY.offset(44.6)):
        with Locations((-23.56, 13.43), (23.56, 13.43)):
            Hole(F_5_0_5_DIAMETER_HOLE3_D / 2, depth=F_5_0_5_DIAMETER_HOLE3_DEPTH)
            with Locations((0, 0, -(F_5_0_5_DIAMETER_HOLE3_DEPTH + F_5_0_5_DIAMETER_HOLE3_TIP / 2))):  # 118° drill point
                Cone(0, F_5_0_5_DIAMETER_HOLE3_D / 2, F_5_0_5_DIAMETER_HOLE3_TIP, mode=Mode.SUBTRACT)

    # Sketch21 → Cut-Extrude3 (cut)
    with BuildSketch(Plane(origin=(0, 0, 0), x_dir=(1, 0, 0), z_dir=(0, 1, 0)).offset(CUT_EXTRUDE3_START)):
        with Locations(Location((0, -70.33, 0), (0, 0, 90))):
            Circle(SKETCH21_R)
        with Locations(Location((0, -20.66, 0), (0, 0, 90))):
            Circle(SKETCH21_R)
    extrude(amount=CUT_EXTRUDE3_DEPTH, mode=Mode.SUBTRACT)


solid = part.part
